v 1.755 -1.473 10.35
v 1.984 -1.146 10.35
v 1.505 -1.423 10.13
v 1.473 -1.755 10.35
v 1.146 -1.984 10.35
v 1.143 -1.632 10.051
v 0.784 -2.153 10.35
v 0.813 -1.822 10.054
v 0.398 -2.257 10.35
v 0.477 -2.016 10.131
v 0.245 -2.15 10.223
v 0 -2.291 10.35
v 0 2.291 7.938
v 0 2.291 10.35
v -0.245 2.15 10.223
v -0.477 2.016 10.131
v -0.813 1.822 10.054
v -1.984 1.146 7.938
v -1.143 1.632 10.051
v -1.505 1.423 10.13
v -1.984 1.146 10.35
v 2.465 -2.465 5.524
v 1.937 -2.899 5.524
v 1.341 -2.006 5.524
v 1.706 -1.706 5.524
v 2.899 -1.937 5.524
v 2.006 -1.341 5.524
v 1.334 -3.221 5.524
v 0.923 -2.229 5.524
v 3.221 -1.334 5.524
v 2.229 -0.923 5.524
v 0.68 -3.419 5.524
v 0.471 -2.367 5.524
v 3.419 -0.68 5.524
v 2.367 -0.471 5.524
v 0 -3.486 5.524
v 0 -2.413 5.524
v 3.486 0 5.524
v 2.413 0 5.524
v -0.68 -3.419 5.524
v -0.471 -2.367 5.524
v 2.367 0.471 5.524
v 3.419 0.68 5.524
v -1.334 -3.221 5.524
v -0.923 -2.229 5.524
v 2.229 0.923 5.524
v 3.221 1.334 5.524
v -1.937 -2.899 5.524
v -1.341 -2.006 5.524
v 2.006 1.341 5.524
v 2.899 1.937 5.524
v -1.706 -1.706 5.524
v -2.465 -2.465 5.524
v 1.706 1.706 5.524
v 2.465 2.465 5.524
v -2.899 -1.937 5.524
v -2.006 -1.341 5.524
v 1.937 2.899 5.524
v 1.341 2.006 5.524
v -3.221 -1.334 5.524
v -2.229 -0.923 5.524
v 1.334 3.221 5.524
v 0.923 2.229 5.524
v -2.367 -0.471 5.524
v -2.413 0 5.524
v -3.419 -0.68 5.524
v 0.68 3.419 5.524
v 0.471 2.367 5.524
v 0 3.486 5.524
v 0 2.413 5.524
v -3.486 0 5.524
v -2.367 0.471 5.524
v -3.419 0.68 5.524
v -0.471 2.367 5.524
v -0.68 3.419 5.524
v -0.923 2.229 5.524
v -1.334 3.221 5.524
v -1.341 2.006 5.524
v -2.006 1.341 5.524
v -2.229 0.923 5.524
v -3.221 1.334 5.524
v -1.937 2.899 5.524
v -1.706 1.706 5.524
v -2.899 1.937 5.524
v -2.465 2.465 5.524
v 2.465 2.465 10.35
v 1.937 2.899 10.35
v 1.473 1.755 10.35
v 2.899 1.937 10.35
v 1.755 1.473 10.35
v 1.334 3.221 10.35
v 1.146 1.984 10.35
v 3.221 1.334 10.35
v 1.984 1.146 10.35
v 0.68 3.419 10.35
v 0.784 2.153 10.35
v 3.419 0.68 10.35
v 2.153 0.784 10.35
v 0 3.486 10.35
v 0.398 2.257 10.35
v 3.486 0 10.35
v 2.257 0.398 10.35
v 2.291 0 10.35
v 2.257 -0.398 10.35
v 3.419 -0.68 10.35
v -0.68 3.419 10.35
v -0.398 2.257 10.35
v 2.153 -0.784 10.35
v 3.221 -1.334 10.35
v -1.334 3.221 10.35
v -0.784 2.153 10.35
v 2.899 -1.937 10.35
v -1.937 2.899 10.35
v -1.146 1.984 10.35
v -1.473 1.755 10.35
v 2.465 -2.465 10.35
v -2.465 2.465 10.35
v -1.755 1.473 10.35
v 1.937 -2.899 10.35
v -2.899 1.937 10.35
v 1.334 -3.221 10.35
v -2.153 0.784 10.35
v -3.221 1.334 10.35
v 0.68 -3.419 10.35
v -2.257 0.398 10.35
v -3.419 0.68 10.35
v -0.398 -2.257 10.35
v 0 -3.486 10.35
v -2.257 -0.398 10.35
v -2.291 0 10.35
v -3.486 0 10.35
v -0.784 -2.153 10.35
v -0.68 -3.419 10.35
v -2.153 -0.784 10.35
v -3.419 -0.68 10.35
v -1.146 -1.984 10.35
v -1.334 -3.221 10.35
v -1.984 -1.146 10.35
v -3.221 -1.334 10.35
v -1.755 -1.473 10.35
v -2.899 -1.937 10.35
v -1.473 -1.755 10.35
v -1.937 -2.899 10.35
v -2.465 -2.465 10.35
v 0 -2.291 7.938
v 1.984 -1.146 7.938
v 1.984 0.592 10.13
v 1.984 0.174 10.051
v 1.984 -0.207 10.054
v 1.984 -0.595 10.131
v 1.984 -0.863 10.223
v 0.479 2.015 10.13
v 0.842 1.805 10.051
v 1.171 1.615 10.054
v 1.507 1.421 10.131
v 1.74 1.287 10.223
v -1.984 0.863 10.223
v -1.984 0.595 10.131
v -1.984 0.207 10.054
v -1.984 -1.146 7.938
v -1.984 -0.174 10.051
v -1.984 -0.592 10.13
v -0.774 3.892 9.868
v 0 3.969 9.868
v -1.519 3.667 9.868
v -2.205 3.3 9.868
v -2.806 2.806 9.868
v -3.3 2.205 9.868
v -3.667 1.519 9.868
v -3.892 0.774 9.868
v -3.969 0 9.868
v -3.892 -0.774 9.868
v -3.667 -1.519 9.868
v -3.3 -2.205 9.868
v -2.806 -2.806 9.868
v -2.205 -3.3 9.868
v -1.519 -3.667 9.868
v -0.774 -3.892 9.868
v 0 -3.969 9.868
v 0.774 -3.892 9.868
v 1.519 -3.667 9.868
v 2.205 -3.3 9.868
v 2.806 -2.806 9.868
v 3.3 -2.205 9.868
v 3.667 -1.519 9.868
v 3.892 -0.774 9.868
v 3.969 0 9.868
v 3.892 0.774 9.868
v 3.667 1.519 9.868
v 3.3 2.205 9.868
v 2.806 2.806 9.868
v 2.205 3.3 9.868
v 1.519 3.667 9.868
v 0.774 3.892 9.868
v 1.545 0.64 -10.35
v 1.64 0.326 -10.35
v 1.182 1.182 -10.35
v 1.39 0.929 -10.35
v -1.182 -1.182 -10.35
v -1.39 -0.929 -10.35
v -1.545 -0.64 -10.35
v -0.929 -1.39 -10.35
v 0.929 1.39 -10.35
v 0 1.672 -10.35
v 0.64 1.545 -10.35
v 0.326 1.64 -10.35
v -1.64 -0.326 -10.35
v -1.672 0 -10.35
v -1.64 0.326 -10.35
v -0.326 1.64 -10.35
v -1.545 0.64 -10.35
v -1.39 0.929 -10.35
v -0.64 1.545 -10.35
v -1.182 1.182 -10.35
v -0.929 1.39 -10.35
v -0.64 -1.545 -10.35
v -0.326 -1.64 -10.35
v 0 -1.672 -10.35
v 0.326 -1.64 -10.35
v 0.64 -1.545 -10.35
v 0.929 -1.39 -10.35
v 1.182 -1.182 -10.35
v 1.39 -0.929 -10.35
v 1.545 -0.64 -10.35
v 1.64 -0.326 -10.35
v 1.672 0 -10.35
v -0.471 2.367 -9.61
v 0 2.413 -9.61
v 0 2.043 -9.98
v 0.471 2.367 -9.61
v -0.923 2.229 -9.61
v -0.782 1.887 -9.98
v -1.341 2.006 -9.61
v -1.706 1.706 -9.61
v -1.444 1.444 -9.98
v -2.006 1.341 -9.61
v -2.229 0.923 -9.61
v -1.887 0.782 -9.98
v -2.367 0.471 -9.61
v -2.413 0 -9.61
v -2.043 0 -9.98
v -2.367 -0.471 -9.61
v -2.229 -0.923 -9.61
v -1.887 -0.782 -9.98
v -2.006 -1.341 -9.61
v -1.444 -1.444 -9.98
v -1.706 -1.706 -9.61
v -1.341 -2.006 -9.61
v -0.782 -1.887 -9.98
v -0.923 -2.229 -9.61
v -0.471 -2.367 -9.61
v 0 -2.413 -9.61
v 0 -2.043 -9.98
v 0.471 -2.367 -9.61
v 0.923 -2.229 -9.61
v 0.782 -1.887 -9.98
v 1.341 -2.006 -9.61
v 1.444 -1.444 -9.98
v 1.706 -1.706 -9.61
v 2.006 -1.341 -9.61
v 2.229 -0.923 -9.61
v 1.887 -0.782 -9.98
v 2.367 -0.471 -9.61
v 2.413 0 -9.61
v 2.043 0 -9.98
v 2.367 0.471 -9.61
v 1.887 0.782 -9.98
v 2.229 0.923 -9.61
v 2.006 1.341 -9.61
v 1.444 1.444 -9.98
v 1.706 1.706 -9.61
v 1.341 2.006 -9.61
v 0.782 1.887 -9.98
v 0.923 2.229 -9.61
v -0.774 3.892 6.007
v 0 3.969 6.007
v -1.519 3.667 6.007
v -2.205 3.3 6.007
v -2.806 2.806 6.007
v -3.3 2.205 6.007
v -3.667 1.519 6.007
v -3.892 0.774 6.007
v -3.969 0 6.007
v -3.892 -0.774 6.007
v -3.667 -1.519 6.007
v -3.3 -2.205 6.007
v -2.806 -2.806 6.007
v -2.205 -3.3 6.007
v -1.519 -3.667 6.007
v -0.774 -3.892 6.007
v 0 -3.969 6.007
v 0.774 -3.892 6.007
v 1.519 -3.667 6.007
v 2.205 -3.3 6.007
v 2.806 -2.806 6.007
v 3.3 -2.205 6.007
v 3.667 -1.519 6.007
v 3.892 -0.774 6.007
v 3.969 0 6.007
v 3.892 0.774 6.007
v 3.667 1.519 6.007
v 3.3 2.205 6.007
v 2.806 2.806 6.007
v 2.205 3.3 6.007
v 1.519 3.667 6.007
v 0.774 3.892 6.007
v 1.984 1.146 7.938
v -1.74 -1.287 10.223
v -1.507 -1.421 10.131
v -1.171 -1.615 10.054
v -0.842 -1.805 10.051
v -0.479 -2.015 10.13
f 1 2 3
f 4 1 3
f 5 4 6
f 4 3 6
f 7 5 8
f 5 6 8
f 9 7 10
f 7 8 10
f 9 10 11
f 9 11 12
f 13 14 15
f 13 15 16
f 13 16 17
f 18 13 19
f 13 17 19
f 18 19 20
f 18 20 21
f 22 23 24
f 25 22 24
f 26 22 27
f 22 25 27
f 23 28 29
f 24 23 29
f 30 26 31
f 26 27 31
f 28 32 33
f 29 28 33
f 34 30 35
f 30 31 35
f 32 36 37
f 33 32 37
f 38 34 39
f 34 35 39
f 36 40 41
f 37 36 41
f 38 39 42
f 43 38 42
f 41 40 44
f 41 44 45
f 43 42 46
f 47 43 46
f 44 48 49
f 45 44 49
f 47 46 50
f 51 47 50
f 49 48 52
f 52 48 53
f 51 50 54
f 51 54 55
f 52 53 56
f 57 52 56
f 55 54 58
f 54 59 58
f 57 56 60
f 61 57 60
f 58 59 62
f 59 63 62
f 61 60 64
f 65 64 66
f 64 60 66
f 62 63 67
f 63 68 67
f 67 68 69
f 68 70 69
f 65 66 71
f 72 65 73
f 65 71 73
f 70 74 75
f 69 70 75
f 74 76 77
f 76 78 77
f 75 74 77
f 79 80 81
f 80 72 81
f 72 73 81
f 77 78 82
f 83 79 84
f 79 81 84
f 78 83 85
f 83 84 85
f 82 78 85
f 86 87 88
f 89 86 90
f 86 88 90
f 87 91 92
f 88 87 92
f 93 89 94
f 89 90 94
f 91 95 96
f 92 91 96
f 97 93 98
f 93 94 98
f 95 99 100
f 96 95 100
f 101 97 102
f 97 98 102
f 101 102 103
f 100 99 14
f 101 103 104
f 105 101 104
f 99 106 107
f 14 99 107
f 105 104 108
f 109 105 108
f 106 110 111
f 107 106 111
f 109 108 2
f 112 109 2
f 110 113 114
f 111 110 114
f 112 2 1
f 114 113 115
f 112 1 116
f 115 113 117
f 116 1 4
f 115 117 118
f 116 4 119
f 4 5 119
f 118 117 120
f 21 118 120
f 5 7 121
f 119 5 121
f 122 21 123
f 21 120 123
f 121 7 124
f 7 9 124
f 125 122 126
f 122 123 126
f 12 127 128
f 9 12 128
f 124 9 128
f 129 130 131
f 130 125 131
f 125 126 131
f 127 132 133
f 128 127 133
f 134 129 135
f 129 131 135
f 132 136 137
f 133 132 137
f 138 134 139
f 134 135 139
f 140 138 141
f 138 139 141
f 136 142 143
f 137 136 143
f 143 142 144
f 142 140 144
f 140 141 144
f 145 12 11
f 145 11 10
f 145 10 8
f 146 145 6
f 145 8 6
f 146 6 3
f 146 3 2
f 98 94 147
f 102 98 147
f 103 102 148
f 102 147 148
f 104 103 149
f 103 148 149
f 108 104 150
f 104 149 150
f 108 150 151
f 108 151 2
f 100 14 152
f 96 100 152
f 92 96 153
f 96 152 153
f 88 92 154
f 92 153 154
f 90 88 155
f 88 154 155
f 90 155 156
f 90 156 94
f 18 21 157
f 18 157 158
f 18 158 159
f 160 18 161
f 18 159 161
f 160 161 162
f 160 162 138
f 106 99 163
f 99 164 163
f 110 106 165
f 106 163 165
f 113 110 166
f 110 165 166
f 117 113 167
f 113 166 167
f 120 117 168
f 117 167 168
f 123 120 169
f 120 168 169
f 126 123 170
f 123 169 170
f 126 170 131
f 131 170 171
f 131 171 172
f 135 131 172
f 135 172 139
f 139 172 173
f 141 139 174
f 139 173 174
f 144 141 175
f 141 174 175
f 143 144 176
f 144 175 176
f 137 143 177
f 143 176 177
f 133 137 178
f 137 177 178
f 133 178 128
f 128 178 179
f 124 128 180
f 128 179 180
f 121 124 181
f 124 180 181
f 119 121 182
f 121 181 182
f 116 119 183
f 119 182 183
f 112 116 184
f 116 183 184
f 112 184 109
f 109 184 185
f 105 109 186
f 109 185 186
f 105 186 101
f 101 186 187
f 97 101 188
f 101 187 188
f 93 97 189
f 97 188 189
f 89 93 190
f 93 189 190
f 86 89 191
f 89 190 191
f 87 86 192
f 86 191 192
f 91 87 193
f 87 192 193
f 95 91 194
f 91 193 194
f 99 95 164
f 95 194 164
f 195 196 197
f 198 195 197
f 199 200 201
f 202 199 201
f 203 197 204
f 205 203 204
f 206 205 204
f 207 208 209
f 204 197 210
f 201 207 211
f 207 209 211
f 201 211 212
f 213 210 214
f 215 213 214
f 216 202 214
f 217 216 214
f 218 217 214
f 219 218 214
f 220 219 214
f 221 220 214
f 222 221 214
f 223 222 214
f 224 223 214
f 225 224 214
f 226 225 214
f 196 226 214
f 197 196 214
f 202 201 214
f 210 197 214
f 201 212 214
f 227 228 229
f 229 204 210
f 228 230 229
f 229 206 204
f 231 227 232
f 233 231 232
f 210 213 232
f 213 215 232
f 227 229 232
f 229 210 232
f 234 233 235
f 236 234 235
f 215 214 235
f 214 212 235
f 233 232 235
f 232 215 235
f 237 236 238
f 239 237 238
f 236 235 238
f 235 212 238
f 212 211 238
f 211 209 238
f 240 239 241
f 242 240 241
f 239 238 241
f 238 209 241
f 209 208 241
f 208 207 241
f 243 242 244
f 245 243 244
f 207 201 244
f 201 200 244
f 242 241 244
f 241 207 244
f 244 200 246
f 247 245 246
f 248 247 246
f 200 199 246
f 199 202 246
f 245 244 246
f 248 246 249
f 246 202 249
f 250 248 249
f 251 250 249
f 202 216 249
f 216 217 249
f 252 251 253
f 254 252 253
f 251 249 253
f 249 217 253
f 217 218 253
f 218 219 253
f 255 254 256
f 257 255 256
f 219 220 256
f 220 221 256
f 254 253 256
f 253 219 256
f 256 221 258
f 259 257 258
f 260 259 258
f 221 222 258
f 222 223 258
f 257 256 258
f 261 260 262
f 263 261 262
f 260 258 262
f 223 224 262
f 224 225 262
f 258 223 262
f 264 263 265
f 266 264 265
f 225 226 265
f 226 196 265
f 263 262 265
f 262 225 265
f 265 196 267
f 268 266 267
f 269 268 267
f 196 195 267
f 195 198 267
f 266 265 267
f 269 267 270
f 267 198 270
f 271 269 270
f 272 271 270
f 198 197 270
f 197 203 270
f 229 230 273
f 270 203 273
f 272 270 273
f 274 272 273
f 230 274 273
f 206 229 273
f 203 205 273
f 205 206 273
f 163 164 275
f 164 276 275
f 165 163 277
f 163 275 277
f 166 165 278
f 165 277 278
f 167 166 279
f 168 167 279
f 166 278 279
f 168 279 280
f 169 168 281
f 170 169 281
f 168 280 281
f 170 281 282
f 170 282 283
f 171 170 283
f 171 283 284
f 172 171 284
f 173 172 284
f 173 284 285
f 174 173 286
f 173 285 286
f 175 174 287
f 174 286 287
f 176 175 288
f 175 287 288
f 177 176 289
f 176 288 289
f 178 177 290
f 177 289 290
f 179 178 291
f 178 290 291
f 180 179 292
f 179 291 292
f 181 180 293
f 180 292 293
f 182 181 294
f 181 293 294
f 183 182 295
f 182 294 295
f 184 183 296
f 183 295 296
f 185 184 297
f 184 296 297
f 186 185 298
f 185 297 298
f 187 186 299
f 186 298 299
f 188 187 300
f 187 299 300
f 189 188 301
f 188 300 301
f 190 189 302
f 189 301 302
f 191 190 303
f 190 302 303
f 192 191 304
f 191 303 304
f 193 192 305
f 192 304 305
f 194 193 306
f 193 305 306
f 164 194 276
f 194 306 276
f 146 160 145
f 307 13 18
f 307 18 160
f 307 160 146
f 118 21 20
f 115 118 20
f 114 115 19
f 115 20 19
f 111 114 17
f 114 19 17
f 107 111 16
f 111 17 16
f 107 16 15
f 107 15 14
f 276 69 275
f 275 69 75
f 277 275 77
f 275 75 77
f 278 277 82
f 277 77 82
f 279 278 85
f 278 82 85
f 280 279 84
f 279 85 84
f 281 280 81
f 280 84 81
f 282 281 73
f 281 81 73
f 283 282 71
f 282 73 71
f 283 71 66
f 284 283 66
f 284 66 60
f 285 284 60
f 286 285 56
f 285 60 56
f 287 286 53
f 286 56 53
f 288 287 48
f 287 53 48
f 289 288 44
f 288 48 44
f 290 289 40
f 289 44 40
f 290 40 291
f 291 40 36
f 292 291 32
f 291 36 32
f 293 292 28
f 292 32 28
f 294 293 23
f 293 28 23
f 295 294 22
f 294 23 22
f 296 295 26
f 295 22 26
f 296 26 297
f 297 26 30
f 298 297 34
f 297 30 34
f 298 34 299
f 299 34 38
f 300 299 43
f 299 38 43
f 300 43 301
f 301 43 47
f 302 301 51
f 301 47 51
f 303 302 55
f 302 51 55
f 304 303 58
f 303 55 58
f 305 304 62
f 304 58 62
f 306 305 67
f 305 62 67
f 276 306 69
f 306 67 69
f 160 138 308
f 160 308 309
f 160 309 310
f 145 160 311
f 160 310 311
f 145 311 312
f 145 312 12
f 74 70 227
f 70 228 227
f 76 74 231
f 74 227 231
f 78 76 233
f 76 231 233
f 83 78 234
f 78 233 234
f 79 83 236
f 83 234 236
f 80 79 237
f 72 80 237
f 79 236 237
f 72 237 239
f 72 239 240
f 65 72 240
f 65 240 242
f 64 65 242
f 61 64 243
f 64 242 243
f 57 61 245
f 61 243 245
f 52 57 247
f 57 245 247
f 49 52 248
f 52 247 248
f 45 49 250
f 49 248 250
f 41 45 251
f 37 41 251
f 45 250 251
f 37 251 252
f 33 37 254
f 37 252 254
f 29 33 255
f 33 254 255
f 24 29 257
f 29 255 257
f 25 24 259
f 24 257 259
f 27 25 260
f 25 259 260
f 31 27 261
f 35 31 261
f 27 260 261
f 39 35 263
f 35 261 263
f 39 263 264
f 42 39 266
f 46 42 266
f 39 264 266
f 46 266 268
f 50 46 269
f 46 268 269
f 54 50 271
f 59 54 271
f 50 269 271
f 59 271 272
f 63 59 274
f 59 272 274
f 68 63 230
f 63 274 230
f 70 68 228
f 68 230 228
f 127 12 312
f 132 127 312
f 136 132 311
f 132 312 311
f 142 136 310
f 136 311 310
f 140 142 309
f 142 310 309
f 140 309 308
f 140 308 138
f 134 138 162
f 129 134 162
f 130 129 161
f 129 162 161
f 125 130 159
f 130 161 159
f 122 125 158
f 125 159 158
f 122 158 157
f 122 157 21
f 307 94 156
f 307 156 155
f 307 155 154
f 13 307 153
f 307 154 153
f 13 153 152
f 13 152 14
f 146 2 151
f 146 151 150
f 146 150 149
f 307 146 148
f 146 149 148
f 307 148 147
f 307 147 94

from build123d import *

# Parameters (mm, degrees)
CUT_EXTRUDE1_DEPTH = 2.413


with BuildPart() as part:
    # Sketch3 → Revolve1 (revolve)
    with BuildSketch(Plane(origin=(0, 0, 0), x_dir=(0, 0, -1), z_dir=(1, 0, 0))):
        Polygon((10.3505, 0), (-10.3505, 0), (-10.3505, 3.48615), (-9.8679, 3.96875), (-6.0071, 3.96875), (-5.5245, 3.48615), (-5.5245, 2.413), (9.609666667, 2.413), (10.3505, 1.672166667), align=None)
    revolve(axis=Axis((0, 0, -10.3505), (0, 0, 1)))

    # Sketch4 → Cut-Extrude1 (cut)
    with BuildSketch(Plane.XY.offset(10.3505)):
        Polygon((0, -2.291358881), (1.984375, -1.14567944), (1.984375, 1.14567944), (0, 2.291358881), (-1.984375, 1.14567944), (-1.984375, -1.14567944), align=None)
    extrude(amount=-CUT_EXTRUDE1_DEPTH, mode=Mode.SUBTRACT)

    # Cut-Extrude3 cone 1 section (through the dimple's axis) → Cut-Extrude3 (revolve, cut)
    with BuildSketch(Plane(origin=(0, 0, 10.3505), x_dir=(0, -1, 0), z_dir=(1, 0, 0))):
        Polygon((0, 0), (2.291358881, 0), (0, 2.291358881), align=None)
    revolve(axis=Axis((0, 0, 10.3505), (0, 0, -1)), mode=Mode.SUBTRACT)


solid = part.part
